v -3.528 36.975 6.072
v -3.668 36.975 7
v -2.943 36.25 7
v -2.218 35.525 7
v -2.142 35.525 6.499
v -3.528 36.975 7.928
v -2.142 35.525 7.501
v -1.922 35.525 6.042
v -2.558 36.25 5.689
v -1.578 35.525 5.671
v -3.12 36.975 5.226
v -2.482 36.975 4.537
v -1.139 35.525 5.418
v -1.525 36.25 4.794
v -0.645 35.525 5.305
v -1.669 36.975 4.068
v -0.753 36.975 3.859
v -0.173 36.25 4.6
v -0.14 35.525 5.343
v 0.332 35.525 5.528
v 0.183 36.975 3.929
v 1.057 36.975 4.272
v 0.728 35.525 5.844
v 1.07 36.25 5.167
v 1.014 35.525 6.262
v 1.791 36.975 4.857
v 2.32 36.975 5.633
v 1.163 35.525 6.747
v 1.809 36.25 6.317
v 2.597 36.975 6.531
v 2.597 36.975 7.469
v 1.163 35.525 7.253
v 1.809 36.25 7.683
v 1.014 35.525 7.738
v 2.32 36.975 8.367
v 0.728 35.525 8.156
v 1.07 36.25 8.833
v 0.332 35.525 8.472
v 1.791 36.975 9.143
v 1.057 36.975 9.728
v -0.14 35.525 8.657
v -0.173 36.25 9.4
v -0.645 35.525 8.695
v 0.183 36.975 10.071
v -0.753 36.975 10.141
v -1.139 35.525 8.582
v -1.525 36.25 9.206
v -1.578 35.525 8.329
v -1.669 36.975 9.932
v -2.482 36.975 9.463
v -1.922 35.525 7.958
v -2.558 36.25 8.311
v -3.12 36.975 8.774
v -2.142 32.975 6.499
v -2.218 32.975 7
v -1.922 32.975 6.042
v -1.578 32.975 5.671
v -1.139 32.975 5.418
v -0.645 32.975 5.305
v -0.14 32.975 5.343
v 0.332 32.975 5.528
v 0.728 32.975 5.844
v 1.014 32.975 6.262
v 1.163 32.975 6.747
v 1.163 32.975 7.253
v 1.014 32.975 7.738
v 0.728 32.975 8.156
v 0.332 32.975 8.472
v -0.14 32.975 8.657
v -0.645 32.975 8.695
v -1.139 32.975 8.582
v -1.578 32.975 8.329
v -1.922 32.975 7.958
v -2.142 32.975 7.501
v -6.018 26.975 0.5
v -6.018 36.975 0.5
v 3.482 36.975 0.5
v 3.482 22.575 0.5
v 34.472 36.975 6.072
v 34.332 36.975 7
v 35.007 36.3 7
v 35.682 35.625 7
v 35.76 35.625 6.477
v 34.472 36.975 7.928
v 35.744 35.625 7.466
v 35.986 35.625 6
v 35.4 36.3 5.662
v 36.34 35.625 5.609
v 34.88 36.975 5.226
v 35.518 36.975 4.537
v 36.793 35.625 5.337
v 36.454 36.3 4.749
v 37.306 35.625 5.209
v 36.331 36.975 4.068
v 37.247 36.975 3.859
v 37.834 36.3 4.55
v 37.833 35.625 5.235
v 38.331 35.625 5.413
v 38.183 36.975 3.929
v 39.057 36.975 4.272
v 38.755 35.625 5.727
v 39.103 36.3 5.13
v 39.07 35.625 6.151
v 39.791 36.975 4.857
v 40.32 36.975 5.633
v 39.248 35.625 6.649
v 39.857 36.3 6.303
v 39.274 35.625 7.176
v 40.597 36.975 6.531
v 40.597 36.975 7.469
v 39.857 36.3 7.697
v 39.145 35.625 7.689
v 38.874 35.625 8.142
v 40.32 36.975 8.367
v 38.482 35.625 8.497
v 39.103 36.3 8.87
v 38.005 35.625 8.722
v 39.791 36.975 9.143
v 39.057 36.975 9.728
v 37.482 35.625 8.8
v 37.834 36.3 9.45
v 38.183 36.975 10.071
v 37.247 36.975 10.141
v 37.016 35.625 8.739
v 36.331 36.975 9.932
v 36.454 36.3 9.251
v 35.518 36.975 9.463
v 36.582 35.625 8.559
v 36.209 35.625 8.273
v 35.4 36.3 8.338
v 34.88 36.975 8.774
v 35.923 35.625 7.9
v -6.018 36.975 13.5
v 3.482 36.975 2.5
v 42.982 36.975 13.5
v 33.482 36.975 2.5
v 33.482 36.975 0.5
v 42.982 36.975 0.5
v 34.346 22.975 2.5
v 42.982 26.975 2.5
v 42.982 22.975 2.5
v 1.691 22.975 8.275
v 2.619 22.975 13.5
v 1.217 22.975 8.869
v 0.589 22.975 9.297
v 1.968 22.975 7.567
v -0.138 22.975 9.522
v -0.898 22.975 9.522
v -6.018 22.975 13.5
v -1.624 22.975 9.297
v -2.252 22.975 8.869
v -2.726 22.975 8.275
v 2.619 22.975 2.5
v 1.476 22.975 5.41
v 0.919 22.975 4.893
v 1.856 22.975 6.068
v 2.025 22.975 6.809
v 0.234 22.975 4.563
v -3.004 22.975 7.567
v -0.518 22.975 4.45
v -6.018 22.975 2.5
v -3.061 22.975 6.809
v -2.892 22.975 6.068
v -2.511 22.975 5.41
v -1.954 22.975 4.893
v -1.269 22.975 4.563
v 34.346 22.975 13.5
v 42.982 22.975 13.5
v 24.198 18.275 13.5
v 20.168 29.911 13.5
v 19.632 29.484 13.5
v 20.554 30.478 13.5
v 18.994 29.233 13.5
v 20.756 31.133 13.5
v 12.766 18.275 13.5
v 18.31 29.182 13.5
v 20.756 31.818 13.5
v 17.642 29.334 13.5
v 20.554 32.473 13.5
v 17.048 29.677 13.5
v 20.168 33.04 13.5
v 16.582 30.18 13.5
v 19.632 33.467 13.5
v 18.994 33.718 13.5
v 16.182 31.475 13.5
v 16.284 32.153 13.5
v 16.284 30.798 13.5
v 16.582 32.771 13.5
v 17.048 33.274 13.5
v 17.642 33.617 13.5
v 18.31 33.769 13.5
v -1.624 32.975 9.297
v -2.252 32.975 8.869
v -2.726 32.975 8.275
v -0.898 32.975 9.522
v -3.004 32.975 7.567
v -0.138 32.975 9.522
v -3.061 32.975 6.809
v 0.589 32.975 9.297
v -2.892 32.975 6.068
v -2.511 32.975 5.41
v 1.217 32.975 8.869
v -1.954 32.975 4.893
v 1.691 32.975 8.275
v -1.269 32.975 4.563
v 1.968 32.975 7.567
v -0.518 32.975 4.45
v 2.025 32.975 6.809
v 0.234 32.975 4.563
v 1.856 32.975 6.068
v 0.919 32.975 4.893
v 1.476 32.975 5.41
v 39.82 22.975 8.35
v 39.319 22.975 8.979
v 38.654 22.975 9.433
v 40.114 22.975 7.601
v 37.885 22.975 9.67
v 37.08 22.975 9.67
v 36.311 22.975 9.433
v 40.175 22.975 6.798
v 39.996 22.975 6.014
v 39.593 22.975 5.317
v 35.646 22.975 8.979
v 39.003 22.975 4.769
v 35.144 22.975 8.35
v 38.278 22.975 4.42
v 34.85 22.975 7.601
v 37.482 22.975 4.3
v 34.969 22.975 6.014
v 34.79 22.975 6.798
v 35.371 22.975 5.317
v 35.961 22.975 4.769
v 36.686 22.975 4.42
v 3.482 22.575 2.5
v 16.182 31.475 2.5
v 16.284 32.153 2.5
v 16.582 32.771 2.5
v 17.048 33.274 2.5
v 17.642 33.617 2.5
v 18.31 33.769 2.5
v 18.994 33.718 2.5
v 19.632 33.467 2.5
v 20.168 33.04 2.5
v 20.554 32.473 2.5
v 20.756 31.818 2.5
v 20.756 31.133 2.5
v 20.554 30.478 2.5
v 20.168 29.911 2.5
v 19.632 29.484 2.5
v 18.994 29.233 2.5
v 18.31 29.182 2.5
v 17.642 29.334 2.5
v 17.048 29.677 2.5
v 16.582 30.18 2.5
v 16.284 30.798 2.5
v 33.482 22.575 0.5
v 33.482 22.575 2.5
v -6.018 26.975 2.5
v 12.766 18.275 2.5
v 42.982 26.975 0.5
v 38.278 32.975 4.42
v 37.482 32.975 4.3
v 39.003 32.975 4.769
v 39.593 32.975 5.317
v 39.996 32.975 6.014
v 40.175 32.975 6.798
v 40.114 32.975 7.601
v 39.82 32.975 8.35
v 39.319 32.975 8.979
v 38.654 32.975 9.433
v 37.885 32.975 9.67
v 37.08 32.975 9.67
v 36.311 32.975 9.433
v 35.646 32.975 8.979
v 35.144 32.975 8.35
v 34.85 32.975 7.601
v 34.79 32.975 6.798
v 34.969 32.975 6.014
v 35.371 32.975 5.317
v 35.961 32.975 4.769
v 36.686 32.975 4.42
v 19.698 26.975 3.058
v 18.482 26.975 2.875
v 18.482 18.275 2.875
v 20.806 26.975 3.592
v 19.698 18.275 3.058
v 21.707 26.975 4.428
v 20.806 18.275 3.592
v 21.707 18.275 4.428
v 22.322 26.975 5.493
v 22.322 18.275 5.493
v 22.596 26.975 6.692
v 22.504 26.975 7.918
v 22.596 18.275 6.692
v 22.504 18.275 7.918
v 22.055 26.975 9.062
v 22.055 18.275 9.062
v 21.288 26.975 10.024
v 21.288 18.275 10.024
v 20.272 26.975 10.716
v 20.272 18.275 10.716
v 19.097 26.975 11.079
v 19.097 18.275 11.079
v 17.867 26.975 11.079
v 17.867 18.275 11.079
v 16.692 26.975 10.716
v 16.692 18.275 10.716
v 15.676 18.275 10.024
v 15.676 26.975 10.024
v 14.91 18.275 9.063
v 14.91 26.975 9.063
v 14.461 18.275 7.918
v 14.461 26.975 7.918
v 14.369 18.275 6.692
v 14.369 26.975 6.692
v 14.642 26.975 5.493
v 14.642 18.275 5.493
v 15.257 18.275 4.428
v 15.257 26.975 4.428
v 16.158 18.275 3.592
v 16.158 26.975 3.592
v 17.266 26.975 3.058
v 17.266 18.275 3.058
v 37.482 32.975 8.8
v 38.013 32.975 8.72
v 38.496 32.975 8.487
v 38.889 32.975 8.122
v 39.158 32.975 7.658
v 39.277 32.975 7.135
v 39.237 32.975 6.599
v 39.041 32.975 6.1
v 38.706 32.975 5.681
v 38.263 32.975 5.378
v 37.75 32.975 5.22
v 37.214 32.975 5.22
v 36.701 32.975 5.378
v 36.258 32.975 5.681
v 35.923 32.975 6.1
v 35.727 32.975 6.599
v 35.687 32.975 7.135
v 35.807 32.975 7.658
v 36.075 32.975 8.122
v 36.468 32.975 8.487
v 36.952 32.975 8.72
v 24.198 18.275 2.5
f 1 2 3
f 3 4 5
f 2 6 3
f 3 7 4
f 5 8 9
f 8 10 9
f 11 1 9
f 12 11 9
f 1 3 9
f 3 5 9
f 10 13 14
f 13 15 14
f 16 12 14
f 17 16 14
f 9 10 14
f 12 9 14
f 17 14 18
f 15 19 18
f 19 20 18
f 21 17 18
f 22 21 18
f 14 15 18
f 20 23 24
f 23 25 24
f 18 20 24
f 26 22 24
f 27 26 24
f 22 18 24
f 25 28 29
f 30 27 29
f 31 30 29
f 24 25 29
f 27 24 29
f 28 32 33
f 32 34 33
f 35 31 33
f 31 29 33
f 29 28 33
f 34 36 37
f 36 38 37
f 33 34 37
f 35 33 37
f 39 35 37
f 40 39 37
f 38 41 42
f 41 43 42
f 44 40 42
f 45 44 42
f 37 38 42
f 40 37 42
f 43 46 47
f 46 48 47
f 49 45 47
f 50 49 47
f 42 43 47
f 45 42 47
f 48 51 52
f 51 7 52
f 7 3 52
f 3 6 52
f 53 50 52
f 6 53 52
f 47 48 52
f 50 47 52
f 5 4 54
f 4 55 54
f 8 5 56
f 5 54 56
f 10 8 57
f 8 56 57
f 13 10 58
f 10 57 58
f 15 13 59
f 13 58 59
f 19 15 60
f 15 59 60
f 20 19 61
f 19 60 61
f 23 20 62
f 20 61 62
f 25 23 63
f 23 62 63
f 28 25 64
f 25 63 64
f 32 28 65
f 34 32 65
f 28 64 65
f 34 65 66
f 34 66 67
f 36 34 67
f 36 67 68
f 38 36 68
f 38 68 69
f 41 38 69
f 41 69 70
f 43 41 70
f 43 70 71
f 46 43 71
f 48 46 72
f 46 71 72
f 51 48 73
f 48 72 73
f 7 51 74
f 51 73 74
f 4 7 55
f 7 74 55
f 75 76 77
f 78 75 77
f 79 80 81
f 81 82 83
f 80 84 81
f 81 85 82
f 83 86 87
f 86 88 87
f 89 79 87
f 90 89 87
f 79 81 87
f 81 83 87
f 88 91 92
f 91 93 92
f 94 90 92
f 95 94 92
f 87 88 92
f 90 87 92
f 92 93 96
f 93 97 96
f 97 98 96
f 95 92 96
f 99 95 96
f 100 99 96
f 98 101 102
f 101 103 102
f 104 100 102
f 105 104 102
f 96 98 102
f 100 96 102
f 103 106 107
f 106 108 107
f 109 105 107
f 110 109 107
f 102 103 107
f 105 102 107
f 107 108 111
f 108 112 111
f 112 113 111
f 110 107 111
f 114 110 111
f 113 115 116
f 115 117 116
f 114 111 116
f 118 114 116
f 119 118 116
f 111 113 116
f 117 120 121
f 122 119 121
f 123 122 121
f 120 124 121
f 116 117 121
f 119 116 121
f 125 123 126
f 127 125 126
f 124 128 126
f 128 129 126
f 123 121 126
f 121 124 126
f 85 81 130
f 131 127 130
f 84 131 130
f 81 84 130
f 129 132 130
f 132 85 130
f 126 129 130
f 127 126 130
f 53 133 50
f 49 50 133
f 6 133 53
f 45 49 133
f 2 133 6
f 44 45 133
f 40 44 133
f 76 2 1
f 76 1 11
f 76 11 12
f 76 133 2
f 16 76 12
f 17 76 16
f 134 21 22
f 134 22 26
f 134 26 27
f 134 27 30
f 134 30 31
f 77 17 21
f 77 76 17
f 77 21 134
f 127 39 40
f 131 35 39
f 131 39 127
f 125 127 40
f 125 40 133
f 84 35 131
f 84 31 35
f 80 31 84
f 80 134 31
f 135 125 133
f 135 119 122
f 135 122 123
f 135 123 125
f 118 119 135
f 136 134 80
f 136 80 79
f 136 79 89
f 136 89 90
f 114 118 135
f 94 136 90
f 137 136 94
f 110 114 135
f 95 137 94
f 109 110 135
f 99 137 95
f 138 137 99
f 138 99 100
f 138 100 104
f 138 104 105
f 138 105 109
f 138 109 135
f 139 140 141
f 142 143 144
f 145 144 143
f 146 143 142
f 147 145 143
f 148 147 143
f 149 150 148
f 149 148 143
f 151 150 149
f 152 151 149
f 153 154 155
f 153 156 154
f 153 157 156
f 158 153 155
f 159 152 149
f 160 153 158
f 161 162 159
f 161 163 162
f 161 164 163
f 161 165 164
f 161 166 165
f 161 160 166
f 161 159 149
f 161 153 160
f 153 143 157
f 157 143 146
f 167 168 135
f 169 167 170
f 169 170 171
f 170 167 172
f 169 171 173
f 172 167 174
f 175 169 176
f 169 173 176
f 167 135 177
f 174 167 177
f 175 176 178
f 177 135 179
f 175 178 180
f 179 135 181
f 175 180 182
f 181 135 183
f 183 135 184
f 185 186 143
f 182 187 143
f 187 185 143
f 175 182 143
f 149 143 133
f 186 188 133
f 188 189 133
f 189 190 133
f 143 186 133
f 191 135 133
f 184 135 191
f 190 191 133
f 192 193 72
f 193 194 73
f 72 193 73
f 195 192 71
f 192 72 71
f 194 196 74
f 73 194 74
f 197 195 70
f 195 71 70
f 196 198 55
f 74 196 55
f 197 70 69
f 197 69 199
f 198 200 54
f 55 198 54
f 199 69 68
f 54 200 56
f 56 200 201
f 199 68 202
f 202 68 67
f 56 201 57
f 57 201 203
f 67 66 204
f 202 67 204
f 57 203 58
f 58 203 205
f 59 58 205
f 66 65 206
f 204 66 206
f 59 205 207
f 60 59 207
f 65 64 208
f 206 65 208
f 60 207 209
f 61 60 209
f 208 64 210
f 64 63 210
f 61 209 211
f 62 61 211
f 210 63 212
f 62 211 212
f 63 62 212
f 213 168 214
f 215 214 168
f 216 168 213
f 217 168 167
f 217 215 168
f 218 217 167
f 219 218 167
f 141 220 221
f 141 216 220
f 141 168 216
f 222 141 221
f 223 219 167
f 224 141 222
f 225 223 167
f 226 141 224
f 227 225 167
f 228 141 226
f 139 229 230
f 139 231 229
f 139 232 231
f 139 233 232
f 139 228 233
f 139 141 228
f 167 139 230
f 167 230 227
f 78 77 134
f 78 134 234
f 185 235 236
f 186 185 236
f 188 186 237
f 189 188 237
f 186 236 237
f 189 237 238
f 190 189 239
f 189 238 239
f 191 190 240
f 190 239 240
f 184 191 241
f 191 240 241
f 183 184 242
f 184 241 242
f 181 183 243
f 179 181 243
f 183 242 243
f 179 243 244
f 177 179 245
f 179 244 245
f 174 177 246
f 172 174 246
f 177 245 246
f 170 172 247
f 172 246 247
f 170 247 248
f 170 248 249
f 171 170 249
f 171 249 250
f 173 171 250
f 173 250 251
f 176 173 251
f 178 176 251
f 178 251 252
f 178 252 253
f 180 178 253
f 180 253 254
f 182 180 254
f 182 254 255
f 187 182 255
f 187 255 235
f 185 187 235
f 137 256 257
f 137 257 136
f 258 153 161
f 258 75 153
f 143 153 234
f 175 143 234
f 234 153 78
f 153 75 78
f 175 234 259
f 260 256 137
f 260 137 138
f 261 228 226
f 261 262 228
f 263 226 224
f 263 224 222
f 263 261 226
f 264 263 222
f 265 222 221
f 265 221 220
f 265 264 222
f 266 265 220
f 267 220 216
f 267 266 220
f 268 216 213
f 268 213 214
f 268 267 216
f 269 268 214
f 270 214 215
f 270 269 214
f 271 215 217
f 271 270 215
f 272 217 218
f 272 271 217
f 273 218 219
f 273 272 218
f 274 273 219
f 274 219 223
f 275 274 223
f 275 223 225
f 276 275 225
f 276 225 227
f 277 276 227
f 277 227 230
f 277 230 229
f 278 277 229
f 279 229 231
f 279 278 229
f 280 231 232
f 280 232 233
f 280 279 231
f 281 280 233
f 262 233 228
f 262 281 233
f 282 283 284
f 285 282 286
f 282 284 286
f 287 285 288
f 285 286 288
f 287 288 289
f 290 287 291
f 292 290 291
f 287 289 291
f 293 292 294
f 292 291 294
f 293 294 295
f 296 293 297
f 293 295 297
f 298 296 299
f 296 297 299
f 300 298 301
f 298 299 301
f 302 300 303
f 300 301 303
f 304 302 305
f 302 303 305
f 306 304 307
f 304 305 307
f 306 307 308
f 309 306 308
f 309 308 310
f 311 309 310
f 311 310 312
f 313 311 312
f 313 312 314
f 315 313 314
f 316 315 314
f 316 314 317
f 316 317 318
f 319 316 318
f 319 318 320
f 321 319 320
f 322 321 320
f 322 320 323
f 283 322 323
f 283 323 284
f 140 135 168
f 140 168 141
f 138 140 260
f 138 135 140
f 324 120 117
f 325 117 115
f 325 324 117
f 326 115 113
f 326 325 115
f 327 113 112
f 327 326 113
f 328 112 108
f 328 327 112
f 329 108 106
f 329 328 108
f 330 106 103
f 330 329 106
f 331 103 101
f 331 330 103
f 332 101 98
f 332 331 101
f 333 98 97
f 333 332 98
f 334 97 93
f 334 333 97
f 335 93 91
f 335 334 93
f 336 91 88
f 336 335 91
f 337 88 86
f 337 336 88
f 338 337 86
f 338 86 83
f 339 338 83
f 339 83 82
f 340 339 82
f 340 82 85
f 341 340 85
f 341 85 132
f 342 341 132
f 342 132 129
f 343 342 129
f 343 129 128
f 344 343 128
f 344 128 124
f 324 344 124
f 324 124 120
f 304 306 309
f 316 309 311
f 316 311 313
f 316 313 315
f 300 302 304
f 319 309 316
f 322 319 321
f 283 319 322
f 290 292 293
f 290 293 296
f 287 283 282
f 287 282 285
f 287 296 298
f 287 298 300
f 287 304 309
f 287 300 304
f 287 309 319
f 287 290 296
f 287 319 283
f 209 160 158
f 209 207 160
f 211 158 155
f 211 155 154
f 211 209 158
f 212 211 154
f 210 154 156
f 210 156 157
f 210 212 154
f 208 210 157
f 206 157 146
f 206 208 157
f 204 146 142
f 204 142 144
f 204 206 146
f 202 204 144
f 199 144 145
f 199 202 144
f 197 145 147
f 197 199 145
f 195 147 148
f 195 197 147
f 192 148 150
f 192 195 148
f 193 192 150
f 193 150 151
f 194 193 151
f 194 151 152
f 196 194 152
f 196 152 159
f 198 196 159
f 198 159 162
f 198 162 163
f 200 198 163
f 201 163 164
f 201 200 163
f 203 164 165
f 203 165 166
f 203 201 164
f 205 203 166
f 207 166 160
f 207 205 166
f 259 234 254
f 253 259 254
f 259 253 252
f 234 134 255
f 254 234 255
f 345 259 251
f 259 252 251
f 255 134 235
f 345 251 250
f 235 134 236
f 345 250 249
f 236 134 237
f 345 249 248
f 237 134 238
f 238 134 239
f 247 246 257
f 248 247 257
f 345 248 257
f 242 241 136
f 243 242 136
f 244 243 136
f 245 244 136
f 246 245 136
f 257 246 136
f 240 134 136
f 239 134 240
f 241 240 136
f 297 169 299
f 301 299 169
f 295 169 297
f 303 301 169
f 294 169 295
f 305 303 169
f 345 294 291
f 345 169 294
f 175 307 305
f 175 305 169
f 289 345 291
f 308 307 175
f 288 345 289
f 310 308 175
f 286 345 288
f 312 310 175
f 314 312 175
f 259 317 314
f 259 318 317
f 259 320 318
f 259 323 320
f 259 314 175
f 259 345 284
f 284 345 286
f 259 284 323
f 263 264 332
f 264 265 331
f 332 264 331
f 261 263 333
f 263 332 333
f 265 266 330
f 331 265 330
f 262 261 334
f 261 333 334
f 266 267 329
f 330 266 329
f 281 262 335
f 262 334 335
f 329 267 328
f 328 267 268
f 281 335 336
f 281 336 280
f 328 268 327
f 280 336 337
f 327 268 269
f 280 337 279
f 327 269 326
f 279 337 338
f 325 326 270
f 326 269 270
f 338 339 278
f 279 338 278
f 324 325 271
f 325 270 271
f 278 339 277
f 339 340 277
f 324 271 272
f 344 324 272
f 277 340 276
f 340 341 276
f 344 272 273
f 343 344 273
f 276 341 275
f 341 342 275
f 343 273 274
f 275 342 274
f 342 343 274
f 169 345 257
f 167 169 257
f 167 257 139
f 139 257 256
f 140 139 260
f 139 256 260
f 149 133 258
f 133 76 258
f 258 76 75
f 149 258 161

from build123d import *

# Parameters (mm, degrees)
BOSS_EXTRUDE1_DEPTH                             = 14
SKETCH3_R                                       = 4.125
CUT_EXTRUDE1_DEPTH                              = 8.8
SKETCH8_R                                       = 2.7
CUT_EXTRUDE3_DEPTH                              = 49.958231273
SKETCH11_W                                      = 49
SKETCH11_H                                      = 0.5
CUT_EXTRUDE6_DEPTH                              = 49.958231273
BOSS_EXTRUDE2_START                             = -4
SKETCH12_R                                      = 2.7
SKETCH12_R_2                                    = 1.5
SKETCH12_R_3                                    = 1.8
BOSS_EXTRUDE2_DEPTH                             = 4
CUT_EXTRUDE7_DEPTH                              = 2
BOSS_EXTRUDE3_START                             = 5
SKETCH18_R                                      = 2.7
SKETCH18_R_2                                    = 2.4
BOSS_EXTRUDE3_DEPTH                             = 5
SKETCH17_R                                      = 2.3
SKETCH17_W                                      = 11.431818182
SKETCH17_H                                      = 0.1
CUT_EXTRUDE8_DEPTH                              = 22
BOSS_EXTRUDE4_DEPTH                             = 4
BOSS_EXTRUDE4_DEPTH_BACK                        = 10
SKETCH20_W                                      = 9.5
SKETCH20_H                                      = 11
SKETCH20_R                                      = 2.7
SKETCH20_R_2                                    = 2.55
CUT_EXTRUDE9_START                              = -10
SKETCH21_R                                      = 2.55
SKETCH21_R_2                                    = 2.7
CUT_EXTRUDE9_DEPTH                              = 10
CSK_FOR_M3_FLAT_HEAD_MACHINE_SCREW1_D           = 3.4
CSK_FOR_M3_FLAT_HEAD_MACHINE_SCREW1_CSINK_D     = 6.3
CSK_FOR_M3_FLAT_HEAD_MACHINE_SCREW1_CSINK_ANGLE = 90


with BuildPart() as part:
    # Sketch2 → Boss-Extrude1 (new body)
    with BuildSketch(Plane.XY):
        Polygon((12.982187117, 18.175494031), (23.982187117, 18.175494031), (42.982187117, 26.975494031), (42.982187117, 36.975494031), (-6.017812883, 36.975494031), (-6.017812883, 26.975494031), align=None)
    extrude(amount=BOSS_EXTRUDE1_DEPTH)

    # Sketch3 → Cut-Extrude1 (cut)
    with BuildSketch(Plane.XZ.offset(-18.175494031)):
        with Locations(Location((18.482187117, 7, 0), (0, 0, 270))):
            Circle(SKETCH3_R)
    extrude(amount=-CUT_EXTRUDE1_DEPTH, mode=Mode.SUBTRACT)

    # Sketch8 → Cut-Extrude3 (cut, through all)
    with BuildSketch(Plane.XZ.offset(-18.175494031)):
        with Locations(Location((37.482187117, 7, 0), (0, 0, 270))):
            Circle(SKETCH8_R)
        with Locations(Location((-0.517812883, 7, 0), (0, 0, 270))):
            Circle(SKETCH8_R)
    extrude(amount=-CUT_EXTRUDE3_DEPTH, mode=Mode.SUBTRACT)

    # Sketch11 → Cut-Extrude6 (cut, through all)
    with BuildSketch(Plane.XZ.offset(-18.175494031)):
        with Locations((18.482187117, 13.75)):
            Rectangle(SKETCH11_W, SKETCH11_H)
        with Locations((18.482187117, 0.25)):
            Rectangle(SKETCH11_W, SKETCH11_H)
    extrude(amount=-CUT_EXTRUDE6_DEPTH, mode=Mode.SUBTRACT)

    # Sketch12 → Boss-Extrude2 (add)
    # profile 1 of 2: a face of its own
    with BuildSketch(Plane(origin=(0, 36.975494031, 0), x_dir=(1, 0, 0), z_dir=(0, 1, 0)).offset(BOSS_EXTRUDE2_START)):
        with Locations((-0.517812883, -7)):
            Circle(SKETCH12_R)
        with Locations(Location((-0.517812883, -7, 0), (0, 0, 270))):
            Circle(SKETCH12_R_2, mode=Mode.SUBTRACT)
    # profile 2 of 2: a face of its own
    with BuildSketch(Plane(origin=(0, 36.975494031, 0), x_dir=(1, 0, 0), z_dir=(0, 1, 0)).offset(BOSS_EXTRUDE2_START)):
        with Locations(Location((37.482187117, -7, 0), (0, 0, 180))):
            Circle(SKETCH12_R)
        with Locations(Location((37.482187117, -7, 0), (0, 0, 270))):
            Circle(SKETCH12_R_3, mode=Mode.SUBTRACT)
    extrude(amount=BOSS_EXTRUDE2_DEPTH)

    # Sketch15 → Cut-Extrude7 (cut)
    with BuildSketch(Plane(origin=(0, 0, 0.5), x_dir=(-1, 0, 0), z_dir=(0, 0, -1))):
        Polygon((-33.482187117, 22.575494031), (-33.482187117, 36.975494031), (-3.482187117, 36.975494031), (-3.482187117, 22.575494031), (-12.982187117, 18.175494031), (-23.982187117, 18.175494031), align=None)
    extrude(amount=-CUT_EXTRUDE7_DEPTH, mode=Mode.SUBTRACT)

    # Sketch18 → Boss-Extrude3 (add)
    # profile 1 of 2: a face of its own
    with BuildSketch(Plane.XZ.offset(-32.975494031).offset(BOSS_EXTRUDE3_START)):
        with Locations(Location((37.482187117, 7, 0), (0, 0, 270))):
            Circle(SKETCH18_R)
        with Locations(Location((37.482187117, 7, 0), (0, 0, 270))):
            Circle(SKETCH18_R_2, mode=Mode.SUBTRACT)
    # profile 2 of 2: a face of its own
    with BuildSketch(Plane.XZ.offset(-32.975494031).offset(BOSS_EXTRUDE3_START)):
        with Locations(Location((-0.517812883, 7, 0), (0, 0, 270))):
            Circle(SKETCH18_R)
        with Locations(Location((-0.517812883, 7, 0), (0, 0, 270))):
            Circle(SKETCH18_R_2, mode=Mode.SUBTRACT)
    extrude(amount=-BOSS_EXTRUDE3_DEPTH)

    # Sketch17 → Cut-Extrude8 (cut)
    with BuildSketch(Plane(origin=(0, 0, 2.5), x_dir=(-1, 0, 0), z_dir=(0, 0, -1))):
        with Locations((-18.482187117, 31.475494031)):
            Circle(SKETCH17_R)
        with Locations((-18.482187117, 18.225494031)):
            Rectangle(SKETCH17_W, SKETCH17_H)
    extrude(amount=-CUT_EXTRUDE8_DEPTH, mode=Mode.SUBTRACT)

    # Sketch20 → Boss-Extrude4 (add, two sides: drawn at the far end of the back side and taken through both)
    # profile 1 of 2: a face of its own
    with BuildSketch(Plane(origin=(0, 26.975494031, 0), x_dir=(-1, 0, 0), z_dir=(0, -1, 0)).offset(-BOSS_EXTRUDE4_DEPTH_BACK)):
        with Locations((-38.232187117, -8)):
            Rectangle(SKETCH20_W, SKETCH20_H)
        with Locations(Location((-37.482187117, -7, 0), (0, 0, 90))):
            Circle(SKETCH20_R, mode=Mode.SUBTRACT)
    # profile 2 of 2: a face of its own
    with BuildSketch(Plane(origin=(0, 26.975494031, 0), x_dir=(-1, 0, 0), z_dir=(0, -1, 0)).offset(-BOSS_EXTRUDE4_DEPTH_BACK)):
        with Locations((1.267812883, -8)):
            Rectangle(SKETCH20_W, SKETCH20_H)
        with Locations(Location((0.517812883, -7, 0), (0, 0, 90))):
            Circle(SKETCH20_R_2, mode=Mode.SUBTRACT)
    extrude(amount=BOSS_EXTRUDE4_DEPTH + BOSS_EXTRUDE4_DEPTH_BACK)

    # Sketch21 → Cut-Extrude9 (cut)
    with BuildSketch(Plane.XZ.offset(-22.975494031).offset(CUT_EXTRUDE9_START)):
        with Locations(Location((-0.517812883, 7, 0), (0, 0, 270))):
            Circle(SKETCH21_R)
        with Locations(Location((37.482187117, 7, 0), (0, 0, 270))):
            Circle(SKETCH21_R_2)
    extrude(amount=CUT_EXTRUDE9_DEPTH, mode=Mode.SUBTRACT)

    # CSK for M3 Flat Head Machine Screw1 (through all)
    with Locations(Plane(origin=(0, 36.975494031, 0), x_dir=(1, 0, 0), z_dir=(0, 1, 0))):
        with Locations((-0.517812883, -7), (37.482187117, -7)):
            CounterSinkHole(CSK_FOR_M3_FLAT_HEAD_MACHINE_SCREW1_D / 2, CSK_FOR_M3_FLAT_HEAD_MACHINE_SCREW1_CSINK_D / 2, counter_sink_angle=CSK_FOR_M3_FLAT_HEAD_MACHINE_SCREW1_CSINK_ANGLE)


solid = part.part
